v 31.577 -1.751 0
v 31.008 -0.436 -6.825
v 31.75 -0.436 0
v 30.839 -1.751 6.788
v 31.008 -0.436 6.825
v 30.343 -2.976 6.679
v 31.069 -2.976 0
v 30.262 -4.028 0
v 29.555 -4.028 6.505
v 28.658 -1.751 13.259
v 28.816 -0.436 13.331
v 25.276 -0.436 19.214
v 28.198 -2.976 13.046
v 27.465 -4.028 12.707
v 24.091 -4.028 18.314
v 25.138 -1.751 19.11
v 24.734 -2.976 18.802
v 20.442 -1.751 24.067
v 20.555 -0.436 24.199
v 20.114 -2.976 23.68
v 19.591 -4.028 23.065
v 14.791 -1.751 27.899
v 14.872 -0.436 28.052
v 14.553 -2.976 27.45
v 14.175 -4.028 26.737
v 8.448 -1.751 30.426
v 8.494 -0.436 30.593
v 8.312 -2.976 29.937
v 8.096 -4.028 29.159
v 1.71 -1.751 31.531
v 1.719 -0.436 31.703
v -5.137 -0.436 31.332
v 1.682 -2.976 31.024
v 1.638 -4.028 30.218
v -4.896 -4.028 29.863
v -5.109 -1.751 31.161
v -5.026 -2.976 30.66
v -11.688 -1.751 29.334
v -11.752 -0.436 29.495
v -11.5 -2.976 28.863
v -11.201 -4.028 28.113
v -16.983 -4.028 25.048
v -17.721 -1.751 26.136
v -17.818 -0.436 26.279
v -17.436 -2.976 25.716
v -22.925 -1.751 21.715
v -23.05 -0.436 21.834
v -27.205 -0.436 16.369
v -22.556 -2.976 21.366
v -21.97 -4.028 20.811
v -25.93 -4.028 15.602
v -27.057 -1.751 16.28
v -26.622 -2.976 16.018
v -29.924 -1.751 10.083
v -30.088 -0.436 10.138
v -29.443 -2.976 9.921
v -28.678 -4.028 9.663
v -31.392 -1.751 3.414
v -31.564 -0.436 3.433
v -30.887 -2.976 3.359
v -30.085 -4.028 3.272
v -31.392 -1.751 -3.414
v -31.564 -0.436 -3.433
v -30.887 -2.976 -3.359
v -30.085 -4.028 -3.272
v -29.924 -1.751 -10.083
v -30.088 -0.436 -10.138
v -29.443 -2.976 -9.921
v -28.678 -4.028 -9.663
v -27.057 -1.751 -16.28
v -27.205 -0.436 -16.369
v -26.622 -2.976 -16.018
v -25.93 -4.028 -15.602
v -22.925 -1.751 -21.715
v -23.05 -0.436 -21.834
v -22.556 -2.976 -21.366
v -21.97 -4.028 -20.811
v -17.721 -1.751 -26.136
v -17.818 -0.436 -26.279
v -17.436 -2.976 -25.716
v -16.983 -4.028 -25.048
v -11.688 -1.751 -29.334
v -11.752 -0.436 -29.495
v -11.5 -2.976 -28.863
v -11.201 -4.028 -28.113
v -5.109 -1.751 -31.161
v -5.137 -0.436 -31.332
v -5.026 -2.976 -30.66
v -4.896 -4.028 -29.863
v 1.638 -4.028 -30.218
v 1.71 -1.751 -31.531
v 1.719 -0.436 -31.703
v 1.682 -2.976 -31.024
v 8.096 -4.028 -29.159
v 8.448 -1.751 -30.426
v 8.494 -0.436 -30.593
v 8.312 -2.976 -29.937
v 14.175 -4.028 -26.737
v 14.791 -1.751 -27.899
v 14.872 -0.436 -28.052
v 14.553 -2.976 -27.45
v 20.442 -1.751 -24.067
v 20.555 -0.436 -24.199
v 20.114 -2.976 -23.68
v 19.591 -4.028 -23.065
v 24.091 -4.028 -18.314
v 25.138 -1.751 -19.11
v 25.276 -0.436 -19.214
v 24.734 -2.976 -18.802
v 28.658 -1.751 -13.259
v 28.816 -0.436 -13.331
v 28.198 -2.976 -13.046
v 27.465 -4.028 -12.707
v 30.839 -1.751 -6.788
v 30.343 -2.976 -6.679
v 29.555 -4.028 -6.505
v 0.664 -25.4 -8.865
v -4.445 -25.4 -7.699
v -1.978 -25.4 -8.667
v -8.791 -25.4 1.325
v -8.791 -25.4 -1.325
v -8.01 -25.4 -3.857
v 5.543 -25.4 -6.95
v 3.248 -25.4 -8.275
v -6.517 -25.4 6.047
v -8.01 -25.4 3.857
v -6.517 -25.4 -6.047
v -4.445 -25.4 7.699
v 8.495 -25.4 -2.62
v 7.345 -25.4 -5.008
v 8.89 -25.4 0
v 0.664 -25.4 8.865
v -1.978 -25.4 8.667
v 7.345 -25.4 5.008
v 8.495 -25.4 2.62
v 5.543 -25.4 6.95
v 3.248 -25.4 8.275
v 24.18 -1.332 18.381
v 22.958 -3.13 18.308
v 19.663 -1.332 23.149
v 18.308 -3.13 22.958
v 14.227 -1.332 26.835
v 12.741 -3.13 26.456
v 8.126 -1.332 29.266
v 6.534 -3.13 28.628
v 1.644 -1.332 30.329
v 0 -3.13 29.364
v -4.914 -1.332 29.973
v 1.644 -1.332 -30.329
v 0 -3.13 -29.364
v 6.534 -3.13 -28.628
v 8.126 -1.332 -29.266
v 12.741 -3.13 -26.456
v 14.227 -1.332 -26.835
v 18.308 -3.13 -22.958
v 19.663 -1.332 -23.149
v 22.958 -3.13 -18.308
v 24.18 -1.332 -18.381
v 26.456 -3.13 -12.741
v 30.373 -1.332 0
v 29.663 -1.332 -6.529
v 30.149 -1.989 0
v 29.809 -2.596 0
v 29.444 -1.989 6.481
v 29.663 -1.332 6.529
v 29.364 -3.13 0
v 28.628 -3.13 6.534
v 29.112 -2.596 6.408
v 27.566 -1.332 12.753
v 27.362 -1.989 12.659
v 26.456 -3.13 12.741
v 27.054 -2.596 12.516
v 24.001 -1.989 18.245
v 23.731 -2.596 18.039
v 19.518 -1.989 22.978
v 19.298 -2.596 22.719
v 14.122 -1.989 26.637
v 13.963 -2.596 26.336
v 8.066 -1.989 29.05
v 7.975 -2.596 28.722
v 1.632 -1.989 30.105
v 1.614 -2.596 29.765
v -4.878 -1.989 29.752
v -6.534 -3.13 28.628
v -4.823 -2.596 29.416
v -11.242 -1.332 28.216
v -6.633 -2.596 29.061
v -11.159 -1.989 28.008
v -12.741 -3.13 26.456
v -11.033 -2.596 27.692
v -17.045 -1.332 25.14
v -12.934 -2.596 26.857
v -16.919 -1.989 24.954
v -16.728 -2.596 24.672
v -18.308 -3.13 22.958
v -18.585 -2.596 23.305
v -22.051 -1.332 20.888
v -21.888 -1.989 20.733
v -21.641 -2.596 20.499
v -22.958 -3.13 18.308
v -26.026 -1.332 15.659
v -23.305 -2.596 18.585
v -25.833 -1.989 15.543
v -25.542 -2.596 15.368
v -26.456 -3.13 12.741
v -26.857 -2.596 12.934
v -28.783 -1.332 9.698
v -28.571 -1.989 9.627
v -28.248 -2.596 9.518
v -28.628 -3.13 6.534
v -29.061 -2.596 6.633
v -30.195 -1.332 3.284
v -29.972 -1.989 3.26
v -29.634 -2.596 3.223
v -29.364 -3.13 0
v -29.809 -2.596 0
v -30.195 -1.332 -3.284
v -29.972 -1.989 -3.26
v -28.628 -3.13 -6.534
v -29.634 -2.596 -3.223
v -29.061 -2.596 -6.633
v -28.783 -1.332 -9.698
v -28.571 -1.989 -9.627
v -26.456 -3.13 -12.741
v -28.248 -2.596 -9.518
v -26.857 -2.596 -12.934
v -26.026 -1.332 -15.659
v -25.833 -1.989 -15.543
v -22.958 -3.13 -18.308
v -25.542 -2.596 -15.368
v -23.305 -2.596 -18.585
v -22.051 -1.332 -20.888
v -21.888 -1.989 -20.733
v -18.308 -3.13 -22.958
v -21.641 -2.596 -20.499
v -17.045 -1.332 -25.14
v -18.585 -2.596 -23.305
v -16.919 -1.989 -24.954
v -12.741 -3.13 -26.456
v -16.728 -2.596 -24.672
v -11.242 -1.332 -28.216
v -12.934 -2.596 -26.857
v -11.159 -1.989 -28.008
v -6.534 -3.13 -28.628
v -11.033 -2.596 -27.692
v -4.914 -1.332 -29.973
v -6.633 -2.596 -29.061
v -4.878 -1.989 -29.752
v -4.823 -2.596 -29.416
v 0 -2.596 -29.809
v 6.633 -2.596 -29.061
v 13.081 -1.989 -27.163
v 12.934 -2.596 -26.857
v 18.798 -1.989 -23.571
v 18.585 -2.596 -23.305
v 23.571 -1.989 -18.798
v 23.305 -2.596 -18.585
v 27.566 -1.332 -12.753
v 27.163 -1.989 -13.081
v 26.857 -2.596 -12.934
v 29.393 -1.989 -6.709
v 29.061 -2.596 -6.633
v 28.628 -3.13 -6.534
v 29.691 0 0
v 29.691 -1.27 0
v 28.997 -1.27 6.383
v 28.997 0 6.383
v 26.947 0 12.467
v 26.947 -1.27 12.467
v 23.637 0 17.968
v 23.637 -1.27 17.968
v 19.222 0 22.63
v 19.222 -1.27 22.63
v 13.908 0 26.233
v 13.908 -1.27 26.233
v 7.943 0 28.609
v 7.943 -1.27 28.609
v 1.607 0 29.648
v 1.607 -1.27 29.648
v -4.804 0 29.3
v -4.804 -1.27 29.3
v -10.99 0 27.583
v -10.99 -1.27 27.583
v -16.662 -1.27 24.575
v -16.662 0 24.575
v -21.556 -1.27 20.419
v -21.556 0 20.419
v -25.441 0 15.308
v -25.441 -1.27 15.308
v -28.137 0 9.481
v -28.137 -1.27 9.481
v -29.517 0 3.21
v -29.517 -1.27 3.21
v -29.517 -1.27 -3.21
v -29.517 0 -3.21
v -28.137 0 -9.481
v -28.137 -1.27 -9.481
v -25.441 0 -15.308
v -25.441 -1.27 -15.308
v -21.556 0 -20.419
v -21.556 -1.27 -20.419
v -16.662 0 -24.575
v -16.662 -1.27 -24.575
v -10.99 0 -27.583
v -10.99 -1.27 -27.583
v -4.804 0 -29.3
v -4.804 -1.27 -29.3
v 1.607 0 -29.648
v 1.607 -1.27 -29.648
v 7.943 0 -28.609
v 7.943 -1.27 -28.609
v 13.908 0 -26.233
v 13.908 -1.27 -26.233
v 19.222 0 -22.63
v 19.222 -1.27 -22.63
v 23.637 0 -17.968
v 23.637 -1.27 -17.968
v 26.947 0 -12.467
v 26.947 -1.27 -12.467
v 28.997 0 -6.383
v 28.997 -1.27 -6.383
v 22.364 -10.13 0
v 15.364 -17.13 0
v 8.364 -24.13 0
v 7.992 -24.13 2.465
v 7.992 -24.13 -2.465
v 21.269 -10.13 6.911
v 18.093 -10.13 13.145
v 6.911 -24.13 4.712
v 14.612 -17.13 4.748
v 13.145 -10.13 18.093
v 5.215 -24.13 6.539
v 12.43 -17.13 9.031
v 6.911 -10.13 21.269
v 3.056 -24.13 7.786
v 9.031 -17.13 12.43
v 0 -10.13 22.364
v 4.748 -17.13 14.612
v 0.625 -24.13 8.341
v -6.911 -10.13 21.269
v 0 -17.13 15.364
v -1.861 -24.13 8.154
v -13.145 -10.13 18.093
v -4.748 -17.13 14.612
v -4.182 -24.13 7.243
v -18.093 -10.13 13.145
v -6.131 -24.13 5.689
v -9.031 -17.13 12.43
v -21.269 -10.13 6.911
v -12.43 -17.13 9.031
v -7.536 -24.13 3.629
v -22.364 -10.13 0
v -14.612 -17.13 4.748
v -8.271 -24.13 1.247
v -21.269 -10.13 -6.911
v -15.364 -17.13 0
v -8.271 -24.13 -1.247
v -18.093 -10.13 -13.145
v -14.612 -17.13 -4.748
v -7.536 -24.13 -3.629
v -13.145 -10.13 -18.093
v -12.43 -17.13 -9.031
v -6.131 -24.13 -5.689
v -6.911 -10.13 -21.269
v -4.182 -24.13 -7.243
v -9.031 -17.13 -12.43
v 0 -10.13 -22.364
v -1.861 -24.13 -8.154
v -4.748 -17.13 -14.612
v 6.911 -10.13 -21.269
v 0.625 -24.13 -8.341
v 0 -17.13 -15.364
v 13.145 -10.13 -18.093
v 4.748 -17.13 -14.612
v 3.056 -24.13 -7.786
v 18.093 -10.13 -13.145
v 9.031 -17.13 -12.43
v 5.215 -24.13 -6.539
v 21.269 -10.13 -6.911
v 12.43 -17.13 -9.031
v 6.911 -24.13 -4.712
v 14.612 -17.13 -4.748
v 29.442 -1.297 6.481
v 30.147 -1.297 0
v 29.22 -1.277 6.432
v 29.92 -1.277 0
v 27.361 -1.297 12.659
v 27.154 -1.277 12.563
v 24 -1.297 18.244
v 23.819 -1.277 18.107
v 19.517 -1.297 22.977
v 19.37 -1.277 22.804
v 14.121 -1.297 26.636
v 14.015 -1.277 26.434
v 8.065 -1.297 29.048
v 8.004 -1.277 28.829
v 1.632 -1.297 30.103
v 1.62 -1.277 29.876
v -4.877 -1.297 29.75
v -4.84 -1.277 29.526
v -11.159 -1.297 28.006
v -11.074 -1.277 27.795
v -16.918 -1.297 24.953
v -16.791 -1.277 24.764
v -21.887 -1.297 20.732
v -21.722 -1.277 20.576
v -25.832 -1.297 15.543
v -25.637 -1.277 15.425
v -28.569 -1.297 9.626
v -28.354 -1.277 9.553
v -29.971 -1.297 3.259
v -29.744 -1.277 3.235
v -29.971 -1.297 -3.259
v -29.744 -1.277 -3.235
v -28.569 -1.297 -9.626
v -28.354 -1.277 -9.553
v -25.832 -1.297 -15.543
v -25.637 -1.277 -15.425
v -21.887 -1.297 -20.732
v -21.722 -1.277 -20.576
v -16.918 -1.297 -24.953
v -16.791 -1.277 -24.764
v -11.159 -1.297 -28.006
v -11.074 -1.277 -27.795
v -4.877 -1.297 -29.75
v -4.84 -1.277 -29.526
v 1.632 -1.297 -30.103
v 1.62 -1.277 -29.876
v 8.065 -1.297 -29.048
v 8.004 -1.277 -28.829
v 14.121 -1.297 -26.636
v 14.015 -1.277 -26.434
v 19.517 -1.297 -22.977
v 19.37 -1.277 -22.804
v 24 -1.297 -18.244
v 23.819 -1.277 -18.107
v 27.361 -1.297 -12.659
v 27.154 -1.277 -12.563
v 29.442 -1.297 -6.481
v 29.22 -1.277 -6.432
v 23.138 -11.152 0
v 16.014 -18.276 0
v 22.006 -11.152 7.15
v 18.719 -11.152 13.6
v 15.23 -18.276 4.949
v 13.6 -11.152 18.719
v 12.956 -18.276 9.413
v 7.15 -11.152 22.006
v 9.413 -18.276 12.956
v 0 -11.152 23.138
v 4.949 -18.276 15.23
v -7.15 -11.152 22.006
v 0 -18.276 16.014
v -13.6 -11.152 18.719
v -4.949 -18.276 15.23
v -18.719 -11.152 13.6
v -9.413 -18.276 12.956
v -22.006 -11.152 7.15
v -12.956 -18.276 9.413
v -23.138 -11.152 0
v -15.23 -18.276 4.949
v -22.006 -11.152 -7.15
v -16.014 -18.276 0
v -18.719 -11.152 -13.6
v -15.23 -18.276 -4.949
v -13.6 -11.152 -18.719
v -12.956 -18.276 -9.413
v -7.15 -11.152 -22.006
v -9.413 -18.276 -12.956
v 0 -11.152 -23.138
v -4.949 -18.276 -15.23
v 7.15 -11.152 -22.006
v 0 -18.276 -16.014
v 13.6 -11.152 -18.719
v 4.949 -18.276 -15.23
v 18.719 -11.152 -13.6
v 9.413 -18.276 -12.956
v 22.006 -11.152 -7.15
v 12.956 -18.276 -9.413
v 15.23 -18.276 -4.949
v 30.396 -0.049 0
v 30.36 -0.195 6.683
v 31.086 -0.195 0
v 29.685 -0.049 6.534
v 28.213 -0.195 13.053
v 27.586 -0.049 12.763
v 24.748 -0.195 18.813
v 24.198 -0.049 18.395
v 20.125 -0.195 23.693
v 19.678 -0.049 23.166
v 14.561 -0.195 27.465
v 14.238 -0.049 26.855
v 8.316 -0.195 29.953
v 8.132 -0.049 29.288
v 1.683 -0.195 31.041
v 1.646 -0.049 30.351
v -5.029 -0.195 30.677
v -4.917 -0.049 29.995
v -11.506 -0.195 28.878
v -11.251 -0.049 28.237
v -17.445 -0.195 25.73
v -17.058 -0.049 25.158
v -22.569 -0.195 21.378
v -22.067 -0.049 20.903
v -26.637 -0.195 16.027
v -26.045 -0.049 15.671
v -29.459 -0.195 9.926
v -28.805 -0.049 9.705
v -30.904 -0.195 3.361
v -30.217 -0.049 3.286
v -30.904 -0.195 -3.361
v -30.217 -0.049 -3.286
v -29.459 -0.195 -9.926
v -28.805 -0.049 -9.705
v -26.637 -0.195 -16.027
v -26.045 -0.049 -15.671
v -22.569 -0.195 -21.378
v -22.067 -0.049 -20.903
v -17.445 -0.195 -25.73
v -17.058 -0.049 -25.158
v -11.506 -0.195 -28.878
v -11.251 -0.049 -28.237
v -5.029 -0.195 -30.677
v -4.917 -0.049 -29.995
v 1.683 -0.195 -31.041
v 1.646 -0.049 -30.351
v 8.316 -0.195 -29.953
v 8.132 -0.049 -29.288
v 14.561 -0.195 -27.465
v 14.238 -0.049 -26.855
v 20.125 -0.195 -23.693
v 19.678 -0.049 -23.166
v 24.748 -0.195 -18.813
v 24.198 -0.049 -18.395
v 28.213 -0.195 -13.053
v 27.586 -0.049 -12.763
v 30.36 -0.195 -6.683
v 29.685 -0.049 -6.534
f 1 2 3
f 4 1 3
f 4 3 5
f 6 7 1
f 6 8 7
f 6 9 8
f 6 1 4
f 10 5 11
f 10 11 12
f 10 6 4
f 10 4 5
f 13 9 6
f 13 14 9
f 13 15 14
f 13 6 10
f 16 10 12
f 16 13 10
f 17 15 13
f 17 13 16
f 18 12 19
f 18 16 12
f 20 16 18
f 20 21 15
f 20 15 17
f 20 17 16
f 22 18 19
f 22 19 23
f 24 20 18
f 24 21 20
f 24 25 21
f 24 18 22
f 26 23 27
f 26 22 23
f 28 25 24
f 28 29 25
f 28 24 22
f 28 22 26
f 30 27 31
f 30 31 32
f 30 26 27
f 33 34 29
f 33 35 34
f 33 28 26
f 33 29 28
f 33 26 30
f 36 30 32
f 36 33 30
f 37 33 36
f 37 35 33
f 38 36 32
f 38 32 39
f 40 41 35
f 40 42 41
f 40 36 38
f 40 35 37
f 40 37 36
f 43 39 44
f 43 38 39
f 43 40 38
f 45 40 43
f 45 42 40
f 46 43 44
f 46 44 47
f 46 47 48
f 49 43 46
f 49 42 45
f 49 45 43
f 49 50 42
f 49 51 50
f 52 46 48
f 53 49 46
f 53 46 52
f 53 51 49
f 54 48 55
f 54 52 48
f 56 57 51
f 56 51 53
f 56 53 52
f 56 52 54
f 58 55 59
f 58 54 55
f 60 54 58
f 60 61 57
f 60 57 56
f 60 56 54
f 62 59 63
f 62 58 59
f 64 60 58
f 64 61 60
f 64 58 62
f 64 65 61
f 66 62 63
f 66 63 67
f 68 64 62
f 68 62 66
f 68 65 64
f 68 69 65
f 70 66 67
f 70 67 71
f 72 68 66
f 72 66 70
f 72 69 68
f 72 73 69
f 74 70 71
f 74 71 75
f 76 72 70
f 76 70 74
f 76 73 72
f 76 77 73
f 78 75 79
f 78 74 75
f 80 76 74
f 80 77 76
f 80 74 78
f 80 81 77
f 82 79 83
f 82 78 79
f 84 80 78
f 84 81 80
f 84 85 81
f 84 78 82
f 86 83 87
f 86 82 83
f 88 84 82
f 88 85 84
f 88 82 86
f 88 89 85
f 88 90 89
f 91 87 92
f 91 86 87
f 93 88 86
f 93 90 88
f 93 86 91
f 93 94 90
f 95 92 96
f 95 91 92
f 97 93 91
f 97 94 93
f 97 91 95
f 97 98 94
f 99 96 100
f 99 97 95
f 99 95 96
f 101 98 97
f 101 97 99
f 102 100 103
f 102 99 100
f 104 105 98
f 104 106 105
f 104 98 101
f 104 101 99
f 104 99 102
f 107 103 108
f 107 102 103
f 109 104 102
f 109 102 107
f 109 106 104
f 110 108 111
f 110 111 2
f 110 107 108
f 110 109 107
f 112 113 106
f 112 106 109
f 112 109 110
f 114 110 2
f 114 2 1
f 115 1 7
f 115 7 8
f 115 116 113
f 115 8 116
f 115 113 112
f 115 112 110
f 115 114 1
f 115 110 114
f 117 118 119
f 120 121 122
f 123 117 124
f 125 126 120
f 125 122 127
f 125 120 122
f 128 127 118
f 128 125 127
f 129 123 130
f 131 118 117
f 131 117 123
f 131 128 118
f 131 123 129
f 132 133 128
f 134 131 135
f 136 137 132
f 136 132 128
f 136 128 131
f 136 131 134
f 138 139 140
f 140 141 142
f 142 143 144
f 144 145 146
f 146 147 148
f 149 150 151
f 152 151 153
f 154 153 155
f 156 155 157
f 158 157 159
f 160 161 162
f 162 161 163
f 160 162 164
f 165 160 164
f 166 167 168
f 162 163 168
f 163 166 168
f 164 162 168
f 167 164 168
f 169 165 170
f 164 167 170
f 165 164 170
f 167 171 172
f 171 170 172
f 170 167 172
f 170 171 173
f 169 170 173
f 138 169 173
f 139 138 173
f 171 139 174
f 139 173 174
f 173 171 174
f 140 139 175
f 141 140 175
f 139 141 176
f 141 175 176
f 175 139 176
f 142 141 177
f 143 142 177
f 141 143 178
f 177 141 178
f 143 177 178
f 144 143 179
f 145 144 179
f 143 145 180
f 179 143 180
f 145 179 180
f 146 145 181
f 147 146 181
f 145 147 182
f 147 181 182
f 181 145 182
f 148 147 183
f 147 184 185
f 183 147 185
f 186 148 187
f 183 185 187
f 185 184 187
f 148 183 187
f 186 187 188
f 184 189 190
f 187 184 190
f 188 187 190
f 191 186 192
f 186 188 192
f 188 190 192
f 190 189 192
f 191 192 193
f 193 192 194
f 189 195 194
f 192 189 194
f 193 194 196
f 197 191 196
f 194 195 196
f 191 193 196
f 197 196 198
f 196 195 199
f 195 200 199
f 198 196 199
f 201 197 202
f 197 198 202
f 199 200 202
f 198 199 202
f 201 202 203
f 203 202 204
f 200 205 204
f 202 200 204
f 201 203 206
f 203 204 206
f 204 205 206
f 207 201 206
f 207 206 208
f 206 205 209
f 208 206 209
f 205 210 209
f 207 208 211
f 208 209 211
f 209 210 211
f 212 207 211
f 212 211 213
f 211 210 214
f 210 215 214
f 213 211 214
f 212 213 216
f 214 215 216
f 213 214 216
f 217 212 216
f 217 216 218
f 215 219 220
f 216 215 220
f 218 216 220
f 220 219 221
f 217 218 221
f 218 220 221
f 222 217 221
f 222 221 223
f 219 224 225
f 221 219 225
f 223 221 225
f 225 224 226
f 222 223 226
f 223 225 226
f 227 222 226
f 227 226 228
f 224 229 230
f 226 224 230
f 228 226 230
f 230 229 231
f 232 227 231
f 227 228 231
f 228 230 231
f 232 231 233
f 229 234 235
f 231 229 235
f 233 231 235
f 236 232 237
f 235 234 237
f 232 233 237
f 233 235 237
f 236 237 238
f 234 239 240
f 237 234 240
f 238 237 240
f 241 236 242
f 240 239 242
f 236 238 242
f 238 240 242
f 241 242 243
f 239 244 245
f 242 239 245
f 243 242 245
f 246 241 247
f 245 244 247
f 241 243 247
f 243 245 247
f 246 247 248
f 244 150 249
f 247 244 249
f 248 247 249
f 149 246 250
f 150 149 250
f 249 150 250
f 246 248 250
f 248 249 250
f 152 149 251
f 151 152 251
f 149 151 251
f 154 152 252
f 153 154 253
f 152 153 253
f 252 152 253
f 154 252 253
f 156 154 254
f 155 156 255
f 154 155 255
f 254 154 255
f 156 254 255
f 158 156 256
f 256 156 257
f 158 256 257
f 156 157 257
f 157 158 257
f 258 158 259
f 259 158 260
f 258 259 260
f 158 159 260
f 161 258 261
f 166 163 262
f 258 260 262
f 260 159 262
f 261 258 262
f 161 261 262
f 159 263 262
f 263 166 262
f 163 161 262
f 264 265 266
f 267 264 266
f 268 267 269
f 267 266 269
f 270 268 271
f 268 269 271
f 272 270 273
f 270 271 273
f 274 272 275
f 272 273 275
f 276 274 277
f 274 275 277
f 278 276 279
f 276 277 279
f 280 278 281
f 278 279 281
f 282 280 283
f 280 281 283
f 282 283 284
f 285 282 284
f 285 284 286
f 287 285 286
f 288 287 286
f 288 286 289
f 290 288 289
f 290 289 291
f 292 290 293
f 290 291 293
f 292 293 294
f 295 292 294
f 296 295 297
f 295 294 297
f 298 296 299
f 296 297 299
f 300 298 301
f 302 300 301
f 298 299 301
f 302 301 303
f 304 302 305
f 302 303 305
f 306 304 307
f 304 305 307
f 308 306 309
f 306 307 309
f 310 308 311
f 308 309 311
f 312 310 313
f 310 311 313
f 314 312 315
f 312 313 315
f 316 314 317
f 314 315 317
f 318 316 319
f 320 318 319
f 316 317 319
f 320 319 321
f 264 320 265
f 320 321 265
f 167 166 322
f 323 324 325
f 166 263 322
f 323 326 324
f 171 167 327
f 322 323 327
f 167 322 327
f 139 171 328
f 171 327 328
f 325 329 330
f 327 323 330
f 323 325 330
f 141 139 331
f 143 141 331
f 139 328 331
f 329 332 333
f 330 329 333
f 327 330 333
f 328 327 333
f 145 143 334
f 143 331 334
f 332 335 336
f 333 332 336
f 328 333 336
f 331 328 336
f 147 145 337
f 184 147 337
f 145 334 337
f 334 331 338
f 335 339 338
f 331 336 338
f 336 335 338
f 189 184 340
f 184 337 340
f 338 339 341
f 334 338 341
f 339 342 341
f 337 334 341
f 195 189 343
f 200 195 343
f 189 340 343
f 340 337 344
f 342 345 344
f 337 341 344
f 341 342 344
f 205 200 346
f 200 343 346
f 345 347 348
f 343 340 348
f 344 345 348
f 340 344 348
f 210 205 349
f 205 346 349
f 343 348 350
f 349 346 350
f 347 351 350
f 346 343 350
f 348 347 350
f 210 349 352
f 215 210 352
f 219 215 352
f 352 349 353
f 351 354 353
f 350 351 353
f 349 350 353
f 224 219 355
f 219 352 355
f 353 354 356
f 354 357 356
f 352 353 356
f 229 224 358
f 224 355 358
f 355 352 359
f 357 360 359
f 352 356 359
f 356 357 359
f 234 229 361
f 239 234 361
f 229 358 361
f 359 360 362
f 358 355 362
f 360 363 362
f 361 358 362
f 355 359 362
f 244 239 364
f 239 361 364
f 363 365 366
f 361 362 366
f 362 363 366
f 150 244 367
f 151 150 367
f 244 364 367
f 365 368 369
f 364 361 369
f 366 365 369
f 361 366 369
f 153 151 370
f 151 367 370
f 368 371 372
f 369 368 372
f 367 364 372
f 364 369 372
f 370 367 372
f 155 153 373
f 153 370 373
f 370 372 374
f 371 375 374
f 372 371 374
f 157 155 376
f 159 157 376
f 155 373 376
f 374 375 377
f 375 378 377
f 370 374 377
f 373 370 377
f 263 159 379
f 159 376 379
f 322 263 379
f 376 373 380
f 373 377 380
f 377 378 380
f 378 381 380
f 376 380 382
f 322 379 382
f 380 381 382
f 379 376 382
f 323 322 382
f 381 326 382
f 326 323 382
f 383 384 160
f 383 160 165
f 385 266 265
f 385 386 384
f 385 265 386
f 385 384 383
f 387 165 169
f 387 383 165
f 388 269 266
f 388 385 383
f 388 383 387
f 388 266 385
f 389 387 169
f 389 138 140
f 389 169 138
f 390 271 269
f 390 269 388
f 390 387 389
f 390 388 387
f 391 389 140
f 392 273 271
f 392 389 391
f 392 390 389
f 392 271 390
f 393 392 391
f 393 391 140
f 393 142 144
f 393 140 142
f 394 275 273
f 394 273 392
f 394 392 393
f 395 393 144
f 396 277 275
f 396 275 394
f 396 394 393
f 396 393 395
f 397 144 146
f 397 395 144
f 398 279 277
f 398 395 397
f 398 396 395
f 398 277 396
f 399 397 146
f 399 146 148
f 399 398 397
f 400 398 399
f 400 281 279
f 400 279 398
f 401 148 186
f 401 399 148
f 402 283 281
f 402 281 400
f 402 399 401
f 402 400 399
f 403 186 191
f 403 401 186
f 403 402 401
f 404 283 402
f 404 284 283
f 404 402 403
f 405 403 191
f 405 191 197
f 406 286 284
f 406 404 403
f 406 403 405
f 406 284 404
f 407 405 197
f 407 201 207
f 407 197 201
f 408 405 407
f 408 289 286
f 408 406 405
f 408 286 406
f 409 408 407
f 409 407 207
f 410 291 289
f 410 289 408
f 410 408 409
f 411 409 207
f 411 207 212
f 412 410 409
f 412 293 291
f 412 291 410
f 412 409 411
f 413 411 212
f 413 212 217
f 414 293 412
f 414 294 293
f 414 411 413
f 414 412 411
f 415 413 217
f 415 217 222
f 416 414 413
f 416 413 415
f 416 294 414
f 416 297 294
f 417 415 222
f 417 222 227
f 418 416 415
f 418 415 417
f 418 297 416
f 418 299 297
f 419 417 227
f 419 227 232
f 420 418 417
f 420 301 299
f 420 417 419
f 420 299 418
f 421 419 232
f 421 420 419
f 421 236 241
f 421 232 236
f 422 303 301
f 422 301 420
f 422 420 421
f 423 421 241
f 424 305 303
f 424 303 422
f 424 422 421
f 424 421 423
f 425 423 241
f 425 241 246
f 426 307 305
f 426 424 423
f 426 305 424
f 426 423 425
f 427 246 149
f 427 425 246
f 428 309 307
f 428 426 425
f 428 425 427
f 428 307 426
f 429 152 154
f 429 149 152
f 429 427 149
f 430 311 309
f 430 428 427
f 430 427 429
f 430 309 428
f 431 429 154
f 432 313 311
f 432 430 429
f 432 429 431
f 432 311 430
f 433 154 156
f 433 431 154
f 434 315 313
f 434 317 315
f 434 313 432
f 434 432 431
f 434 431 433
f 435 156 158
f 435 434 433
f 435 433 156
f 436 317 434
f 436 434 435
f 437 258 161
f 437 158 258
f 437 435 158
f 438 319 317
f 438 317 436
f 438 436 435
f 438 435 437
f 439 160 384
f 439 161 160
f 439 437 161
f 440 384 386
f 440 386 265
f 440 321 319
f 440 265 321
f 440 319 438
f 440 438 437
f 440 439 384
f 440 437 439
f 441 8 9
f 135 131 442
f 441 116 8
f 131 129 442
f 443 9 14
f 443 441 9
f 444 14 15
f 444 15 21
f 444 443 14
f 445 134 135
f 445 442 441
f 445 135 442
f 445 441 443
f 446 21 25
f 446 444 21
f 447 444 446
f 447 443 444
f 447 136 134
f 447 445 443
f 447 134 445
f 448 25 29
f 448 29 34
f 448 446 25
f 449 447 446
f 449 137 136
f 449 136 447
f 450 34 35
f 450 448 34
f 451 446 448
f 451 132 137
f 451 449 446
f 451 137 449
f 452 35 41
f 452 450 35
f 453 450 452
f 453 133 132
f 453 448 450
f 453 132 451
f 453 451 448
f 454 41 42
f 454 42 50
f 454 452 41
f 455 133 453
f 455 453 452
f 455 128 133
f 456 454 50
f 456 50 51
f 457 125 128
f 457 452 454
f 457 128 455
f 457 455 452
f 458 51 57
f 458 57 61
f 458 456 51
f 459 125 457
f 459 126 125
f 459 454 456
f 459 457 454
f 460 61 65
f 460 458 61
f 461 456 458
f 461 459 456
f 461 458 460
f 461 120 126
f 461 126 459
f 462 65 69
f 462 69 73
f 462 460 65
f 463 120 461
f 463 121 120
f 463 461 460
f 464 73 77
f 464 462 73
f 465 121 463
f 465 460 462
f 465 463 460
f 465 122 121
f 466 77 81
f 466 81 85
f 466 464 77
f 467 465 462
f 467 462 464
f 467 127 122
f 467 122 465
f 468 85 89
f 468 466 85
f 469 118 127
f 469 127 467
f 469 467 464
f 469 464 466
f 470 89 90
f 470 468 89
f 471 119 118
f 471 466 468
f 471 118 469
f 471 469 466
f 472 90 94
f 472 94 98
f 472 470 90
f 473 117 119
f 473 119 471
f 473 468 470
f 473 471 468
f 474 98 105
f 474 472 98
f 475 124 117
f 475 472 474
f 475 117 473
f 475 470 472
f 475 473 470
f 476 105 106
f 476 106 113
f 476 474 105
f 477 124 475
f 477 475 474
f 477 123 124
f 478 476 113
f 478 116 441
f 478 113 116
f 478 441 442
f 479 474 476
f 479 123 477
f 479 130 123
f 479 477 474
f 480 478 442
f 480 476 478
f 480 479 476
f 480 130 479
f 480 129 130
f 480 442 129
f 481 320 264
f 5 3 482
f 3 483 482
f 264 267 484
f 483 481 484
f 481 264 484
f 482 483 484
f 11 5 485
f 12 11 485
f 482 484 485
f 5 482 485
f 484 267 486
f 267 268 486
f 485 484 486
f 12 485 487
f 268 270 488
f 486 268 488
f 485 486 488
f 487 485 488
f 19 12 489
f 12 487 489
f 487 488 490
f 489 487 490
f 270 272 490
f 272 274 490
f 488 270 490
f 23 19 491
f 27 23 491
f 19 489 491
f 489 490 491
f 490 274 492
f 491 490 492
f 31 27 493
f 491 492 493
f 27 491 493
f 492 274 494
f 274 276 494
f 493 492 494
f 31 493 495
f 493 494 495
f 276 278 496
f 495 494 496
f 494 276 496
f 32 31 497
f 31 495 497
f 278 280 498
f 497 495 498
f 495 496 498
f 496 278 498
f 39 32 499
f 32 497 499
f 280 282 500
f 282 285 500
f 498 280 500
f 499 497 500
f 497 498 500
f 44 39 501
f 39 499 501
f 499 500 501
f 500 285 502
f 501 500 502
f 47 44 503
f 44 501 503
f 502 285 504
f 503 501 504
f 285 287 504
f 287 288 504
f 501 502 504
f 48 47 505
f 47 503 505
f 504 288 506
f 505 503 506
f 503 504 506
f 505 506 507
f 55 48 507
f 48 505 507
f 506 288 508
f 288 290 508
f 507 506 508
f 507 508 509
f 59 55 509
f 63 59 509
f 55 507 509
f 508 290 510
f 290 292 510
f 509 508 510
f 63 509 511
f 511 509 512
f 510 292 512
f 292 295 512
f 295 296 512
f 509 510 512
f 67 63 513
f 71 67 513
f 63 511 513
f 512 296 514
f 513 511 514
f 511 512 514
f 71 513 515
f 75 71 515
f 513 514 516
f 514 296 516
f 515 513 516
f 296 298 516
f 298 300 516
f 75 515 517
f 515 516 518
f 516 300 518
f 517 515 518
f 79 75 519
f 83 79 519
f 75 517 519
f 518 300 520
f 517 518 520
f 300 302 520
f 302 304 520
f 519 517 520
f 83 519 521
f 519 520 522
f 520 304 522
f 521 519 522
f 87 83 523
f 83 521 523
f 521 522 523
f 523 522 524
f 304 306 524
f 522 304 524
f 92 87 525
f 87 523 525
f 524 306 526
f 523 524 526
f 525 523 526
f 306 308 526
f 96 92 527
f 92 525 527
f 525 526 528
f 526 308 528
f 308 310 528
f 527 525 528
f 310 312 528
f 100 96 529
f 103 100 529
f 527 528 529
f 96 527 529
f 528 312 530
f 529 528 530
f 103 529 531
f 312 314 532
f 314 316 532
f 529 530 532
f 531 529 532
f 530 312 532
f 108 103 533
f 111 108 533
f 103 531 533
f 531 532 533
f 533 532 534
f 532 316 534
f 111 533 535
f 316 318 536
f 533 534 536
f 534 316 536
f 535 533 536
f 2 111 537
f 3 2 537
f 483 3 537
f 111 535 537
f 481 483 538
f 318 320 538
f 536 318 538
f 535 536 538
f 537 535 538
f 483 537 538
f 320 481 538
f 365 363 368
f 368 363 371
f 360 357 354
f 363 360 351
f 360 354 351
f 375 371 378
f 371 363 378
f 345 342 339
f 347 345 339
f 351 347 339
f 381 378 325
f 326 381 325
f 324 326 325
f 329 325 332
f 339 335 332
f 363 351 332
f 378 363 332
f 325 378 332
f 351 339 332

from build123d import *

# Parameters (mm, degrees)
F0_R     = 31.75
F1_DEPTH = 25.4
F2_SIZE  = 22.86
F5_T     = -1.27


# Not quite as in the source:
# - a fillet or chamfer that OpenCascade refuses, or shapes differently, is made with other operations: its cross-section is extruded or revolved along the edge and cut away or added
# - a feature of the source that left no trace in its solid (it failed there, or was rolled back) is left out
# - a shell that OpenCascade refuses in one call is made with other operations: the cavity is built on its own and cut out


with BuildPart() as f1:
    # F0 (on Front) → F1 (new body)
    with BuildSketch(Plane.XZ):
        Circle(F0_R)
    extrude(amount=F1_DEPTH)

    # F2
    f2_edges = [f1.edges().sort_by_distance(p)[0] for p in [
        (-31.75, -25.4, 0),
    ]]
    chamfer(f2_edges, length=F2_SIZE)

    # F4: fillet of radius 5.08 on 2 edges, made by hand

    # F4_s1 → F4_t2 (revolve, cut)
    with BuildSketch(Plane.XY):
        with BuildLine():
            ThreePointArc((31.75, -0.4357951031), (31.3633080252, -2.3798269396), (30.2621024484, -4.0278975516))
            Line((30.2621024484, -4.0278975516), (31.75, -2.54))
            Line((31.75, -2.54), (31.75, -0.4357951031))
        make_face()
    revolve(axis=Axis((0, -2.54, 0), (0, -1, 0)), mode=Mode.SUBTRACT)

    # F4_s3 → F4_t4 (revolve, cut)
    with BuildSketch(Plane.XY):
        with BuildLine():
            ThreePointArc((31.75, -0.4357951031), (30.7435201994, -0.1101428151), (29.691417751, 0))
            Line((29.691417751, 0), (31.75, 0))
            Line((31.75, 0), (31.75, -0.4357951031))
        make_face()
    revolve(axis=Axis((0, 0, 0), (0, -1, 0)), mode=Mode.SUBTRACT)

    # F5: a shell. OpenCascade refuses it in one call, so the cavity is built on its own and cut out:
    # the body offset inwards by the wall thickness, plus a prism from it out through each open face.
    f5_core = offset(f1.part, amount=F5_T, mode=Mode.PRIVATE)
    f5_exits = [f5_core.faces().sort_by_distance(p)[0] for p in [
        (0, -1.27, 0),
    ]]
    add(f5_core, mode=Mode.SUBTRACT)
    extrude(f5_exits, amount=-F5_T, mode=Mode.SUBTRACT)


solid = f1.part
